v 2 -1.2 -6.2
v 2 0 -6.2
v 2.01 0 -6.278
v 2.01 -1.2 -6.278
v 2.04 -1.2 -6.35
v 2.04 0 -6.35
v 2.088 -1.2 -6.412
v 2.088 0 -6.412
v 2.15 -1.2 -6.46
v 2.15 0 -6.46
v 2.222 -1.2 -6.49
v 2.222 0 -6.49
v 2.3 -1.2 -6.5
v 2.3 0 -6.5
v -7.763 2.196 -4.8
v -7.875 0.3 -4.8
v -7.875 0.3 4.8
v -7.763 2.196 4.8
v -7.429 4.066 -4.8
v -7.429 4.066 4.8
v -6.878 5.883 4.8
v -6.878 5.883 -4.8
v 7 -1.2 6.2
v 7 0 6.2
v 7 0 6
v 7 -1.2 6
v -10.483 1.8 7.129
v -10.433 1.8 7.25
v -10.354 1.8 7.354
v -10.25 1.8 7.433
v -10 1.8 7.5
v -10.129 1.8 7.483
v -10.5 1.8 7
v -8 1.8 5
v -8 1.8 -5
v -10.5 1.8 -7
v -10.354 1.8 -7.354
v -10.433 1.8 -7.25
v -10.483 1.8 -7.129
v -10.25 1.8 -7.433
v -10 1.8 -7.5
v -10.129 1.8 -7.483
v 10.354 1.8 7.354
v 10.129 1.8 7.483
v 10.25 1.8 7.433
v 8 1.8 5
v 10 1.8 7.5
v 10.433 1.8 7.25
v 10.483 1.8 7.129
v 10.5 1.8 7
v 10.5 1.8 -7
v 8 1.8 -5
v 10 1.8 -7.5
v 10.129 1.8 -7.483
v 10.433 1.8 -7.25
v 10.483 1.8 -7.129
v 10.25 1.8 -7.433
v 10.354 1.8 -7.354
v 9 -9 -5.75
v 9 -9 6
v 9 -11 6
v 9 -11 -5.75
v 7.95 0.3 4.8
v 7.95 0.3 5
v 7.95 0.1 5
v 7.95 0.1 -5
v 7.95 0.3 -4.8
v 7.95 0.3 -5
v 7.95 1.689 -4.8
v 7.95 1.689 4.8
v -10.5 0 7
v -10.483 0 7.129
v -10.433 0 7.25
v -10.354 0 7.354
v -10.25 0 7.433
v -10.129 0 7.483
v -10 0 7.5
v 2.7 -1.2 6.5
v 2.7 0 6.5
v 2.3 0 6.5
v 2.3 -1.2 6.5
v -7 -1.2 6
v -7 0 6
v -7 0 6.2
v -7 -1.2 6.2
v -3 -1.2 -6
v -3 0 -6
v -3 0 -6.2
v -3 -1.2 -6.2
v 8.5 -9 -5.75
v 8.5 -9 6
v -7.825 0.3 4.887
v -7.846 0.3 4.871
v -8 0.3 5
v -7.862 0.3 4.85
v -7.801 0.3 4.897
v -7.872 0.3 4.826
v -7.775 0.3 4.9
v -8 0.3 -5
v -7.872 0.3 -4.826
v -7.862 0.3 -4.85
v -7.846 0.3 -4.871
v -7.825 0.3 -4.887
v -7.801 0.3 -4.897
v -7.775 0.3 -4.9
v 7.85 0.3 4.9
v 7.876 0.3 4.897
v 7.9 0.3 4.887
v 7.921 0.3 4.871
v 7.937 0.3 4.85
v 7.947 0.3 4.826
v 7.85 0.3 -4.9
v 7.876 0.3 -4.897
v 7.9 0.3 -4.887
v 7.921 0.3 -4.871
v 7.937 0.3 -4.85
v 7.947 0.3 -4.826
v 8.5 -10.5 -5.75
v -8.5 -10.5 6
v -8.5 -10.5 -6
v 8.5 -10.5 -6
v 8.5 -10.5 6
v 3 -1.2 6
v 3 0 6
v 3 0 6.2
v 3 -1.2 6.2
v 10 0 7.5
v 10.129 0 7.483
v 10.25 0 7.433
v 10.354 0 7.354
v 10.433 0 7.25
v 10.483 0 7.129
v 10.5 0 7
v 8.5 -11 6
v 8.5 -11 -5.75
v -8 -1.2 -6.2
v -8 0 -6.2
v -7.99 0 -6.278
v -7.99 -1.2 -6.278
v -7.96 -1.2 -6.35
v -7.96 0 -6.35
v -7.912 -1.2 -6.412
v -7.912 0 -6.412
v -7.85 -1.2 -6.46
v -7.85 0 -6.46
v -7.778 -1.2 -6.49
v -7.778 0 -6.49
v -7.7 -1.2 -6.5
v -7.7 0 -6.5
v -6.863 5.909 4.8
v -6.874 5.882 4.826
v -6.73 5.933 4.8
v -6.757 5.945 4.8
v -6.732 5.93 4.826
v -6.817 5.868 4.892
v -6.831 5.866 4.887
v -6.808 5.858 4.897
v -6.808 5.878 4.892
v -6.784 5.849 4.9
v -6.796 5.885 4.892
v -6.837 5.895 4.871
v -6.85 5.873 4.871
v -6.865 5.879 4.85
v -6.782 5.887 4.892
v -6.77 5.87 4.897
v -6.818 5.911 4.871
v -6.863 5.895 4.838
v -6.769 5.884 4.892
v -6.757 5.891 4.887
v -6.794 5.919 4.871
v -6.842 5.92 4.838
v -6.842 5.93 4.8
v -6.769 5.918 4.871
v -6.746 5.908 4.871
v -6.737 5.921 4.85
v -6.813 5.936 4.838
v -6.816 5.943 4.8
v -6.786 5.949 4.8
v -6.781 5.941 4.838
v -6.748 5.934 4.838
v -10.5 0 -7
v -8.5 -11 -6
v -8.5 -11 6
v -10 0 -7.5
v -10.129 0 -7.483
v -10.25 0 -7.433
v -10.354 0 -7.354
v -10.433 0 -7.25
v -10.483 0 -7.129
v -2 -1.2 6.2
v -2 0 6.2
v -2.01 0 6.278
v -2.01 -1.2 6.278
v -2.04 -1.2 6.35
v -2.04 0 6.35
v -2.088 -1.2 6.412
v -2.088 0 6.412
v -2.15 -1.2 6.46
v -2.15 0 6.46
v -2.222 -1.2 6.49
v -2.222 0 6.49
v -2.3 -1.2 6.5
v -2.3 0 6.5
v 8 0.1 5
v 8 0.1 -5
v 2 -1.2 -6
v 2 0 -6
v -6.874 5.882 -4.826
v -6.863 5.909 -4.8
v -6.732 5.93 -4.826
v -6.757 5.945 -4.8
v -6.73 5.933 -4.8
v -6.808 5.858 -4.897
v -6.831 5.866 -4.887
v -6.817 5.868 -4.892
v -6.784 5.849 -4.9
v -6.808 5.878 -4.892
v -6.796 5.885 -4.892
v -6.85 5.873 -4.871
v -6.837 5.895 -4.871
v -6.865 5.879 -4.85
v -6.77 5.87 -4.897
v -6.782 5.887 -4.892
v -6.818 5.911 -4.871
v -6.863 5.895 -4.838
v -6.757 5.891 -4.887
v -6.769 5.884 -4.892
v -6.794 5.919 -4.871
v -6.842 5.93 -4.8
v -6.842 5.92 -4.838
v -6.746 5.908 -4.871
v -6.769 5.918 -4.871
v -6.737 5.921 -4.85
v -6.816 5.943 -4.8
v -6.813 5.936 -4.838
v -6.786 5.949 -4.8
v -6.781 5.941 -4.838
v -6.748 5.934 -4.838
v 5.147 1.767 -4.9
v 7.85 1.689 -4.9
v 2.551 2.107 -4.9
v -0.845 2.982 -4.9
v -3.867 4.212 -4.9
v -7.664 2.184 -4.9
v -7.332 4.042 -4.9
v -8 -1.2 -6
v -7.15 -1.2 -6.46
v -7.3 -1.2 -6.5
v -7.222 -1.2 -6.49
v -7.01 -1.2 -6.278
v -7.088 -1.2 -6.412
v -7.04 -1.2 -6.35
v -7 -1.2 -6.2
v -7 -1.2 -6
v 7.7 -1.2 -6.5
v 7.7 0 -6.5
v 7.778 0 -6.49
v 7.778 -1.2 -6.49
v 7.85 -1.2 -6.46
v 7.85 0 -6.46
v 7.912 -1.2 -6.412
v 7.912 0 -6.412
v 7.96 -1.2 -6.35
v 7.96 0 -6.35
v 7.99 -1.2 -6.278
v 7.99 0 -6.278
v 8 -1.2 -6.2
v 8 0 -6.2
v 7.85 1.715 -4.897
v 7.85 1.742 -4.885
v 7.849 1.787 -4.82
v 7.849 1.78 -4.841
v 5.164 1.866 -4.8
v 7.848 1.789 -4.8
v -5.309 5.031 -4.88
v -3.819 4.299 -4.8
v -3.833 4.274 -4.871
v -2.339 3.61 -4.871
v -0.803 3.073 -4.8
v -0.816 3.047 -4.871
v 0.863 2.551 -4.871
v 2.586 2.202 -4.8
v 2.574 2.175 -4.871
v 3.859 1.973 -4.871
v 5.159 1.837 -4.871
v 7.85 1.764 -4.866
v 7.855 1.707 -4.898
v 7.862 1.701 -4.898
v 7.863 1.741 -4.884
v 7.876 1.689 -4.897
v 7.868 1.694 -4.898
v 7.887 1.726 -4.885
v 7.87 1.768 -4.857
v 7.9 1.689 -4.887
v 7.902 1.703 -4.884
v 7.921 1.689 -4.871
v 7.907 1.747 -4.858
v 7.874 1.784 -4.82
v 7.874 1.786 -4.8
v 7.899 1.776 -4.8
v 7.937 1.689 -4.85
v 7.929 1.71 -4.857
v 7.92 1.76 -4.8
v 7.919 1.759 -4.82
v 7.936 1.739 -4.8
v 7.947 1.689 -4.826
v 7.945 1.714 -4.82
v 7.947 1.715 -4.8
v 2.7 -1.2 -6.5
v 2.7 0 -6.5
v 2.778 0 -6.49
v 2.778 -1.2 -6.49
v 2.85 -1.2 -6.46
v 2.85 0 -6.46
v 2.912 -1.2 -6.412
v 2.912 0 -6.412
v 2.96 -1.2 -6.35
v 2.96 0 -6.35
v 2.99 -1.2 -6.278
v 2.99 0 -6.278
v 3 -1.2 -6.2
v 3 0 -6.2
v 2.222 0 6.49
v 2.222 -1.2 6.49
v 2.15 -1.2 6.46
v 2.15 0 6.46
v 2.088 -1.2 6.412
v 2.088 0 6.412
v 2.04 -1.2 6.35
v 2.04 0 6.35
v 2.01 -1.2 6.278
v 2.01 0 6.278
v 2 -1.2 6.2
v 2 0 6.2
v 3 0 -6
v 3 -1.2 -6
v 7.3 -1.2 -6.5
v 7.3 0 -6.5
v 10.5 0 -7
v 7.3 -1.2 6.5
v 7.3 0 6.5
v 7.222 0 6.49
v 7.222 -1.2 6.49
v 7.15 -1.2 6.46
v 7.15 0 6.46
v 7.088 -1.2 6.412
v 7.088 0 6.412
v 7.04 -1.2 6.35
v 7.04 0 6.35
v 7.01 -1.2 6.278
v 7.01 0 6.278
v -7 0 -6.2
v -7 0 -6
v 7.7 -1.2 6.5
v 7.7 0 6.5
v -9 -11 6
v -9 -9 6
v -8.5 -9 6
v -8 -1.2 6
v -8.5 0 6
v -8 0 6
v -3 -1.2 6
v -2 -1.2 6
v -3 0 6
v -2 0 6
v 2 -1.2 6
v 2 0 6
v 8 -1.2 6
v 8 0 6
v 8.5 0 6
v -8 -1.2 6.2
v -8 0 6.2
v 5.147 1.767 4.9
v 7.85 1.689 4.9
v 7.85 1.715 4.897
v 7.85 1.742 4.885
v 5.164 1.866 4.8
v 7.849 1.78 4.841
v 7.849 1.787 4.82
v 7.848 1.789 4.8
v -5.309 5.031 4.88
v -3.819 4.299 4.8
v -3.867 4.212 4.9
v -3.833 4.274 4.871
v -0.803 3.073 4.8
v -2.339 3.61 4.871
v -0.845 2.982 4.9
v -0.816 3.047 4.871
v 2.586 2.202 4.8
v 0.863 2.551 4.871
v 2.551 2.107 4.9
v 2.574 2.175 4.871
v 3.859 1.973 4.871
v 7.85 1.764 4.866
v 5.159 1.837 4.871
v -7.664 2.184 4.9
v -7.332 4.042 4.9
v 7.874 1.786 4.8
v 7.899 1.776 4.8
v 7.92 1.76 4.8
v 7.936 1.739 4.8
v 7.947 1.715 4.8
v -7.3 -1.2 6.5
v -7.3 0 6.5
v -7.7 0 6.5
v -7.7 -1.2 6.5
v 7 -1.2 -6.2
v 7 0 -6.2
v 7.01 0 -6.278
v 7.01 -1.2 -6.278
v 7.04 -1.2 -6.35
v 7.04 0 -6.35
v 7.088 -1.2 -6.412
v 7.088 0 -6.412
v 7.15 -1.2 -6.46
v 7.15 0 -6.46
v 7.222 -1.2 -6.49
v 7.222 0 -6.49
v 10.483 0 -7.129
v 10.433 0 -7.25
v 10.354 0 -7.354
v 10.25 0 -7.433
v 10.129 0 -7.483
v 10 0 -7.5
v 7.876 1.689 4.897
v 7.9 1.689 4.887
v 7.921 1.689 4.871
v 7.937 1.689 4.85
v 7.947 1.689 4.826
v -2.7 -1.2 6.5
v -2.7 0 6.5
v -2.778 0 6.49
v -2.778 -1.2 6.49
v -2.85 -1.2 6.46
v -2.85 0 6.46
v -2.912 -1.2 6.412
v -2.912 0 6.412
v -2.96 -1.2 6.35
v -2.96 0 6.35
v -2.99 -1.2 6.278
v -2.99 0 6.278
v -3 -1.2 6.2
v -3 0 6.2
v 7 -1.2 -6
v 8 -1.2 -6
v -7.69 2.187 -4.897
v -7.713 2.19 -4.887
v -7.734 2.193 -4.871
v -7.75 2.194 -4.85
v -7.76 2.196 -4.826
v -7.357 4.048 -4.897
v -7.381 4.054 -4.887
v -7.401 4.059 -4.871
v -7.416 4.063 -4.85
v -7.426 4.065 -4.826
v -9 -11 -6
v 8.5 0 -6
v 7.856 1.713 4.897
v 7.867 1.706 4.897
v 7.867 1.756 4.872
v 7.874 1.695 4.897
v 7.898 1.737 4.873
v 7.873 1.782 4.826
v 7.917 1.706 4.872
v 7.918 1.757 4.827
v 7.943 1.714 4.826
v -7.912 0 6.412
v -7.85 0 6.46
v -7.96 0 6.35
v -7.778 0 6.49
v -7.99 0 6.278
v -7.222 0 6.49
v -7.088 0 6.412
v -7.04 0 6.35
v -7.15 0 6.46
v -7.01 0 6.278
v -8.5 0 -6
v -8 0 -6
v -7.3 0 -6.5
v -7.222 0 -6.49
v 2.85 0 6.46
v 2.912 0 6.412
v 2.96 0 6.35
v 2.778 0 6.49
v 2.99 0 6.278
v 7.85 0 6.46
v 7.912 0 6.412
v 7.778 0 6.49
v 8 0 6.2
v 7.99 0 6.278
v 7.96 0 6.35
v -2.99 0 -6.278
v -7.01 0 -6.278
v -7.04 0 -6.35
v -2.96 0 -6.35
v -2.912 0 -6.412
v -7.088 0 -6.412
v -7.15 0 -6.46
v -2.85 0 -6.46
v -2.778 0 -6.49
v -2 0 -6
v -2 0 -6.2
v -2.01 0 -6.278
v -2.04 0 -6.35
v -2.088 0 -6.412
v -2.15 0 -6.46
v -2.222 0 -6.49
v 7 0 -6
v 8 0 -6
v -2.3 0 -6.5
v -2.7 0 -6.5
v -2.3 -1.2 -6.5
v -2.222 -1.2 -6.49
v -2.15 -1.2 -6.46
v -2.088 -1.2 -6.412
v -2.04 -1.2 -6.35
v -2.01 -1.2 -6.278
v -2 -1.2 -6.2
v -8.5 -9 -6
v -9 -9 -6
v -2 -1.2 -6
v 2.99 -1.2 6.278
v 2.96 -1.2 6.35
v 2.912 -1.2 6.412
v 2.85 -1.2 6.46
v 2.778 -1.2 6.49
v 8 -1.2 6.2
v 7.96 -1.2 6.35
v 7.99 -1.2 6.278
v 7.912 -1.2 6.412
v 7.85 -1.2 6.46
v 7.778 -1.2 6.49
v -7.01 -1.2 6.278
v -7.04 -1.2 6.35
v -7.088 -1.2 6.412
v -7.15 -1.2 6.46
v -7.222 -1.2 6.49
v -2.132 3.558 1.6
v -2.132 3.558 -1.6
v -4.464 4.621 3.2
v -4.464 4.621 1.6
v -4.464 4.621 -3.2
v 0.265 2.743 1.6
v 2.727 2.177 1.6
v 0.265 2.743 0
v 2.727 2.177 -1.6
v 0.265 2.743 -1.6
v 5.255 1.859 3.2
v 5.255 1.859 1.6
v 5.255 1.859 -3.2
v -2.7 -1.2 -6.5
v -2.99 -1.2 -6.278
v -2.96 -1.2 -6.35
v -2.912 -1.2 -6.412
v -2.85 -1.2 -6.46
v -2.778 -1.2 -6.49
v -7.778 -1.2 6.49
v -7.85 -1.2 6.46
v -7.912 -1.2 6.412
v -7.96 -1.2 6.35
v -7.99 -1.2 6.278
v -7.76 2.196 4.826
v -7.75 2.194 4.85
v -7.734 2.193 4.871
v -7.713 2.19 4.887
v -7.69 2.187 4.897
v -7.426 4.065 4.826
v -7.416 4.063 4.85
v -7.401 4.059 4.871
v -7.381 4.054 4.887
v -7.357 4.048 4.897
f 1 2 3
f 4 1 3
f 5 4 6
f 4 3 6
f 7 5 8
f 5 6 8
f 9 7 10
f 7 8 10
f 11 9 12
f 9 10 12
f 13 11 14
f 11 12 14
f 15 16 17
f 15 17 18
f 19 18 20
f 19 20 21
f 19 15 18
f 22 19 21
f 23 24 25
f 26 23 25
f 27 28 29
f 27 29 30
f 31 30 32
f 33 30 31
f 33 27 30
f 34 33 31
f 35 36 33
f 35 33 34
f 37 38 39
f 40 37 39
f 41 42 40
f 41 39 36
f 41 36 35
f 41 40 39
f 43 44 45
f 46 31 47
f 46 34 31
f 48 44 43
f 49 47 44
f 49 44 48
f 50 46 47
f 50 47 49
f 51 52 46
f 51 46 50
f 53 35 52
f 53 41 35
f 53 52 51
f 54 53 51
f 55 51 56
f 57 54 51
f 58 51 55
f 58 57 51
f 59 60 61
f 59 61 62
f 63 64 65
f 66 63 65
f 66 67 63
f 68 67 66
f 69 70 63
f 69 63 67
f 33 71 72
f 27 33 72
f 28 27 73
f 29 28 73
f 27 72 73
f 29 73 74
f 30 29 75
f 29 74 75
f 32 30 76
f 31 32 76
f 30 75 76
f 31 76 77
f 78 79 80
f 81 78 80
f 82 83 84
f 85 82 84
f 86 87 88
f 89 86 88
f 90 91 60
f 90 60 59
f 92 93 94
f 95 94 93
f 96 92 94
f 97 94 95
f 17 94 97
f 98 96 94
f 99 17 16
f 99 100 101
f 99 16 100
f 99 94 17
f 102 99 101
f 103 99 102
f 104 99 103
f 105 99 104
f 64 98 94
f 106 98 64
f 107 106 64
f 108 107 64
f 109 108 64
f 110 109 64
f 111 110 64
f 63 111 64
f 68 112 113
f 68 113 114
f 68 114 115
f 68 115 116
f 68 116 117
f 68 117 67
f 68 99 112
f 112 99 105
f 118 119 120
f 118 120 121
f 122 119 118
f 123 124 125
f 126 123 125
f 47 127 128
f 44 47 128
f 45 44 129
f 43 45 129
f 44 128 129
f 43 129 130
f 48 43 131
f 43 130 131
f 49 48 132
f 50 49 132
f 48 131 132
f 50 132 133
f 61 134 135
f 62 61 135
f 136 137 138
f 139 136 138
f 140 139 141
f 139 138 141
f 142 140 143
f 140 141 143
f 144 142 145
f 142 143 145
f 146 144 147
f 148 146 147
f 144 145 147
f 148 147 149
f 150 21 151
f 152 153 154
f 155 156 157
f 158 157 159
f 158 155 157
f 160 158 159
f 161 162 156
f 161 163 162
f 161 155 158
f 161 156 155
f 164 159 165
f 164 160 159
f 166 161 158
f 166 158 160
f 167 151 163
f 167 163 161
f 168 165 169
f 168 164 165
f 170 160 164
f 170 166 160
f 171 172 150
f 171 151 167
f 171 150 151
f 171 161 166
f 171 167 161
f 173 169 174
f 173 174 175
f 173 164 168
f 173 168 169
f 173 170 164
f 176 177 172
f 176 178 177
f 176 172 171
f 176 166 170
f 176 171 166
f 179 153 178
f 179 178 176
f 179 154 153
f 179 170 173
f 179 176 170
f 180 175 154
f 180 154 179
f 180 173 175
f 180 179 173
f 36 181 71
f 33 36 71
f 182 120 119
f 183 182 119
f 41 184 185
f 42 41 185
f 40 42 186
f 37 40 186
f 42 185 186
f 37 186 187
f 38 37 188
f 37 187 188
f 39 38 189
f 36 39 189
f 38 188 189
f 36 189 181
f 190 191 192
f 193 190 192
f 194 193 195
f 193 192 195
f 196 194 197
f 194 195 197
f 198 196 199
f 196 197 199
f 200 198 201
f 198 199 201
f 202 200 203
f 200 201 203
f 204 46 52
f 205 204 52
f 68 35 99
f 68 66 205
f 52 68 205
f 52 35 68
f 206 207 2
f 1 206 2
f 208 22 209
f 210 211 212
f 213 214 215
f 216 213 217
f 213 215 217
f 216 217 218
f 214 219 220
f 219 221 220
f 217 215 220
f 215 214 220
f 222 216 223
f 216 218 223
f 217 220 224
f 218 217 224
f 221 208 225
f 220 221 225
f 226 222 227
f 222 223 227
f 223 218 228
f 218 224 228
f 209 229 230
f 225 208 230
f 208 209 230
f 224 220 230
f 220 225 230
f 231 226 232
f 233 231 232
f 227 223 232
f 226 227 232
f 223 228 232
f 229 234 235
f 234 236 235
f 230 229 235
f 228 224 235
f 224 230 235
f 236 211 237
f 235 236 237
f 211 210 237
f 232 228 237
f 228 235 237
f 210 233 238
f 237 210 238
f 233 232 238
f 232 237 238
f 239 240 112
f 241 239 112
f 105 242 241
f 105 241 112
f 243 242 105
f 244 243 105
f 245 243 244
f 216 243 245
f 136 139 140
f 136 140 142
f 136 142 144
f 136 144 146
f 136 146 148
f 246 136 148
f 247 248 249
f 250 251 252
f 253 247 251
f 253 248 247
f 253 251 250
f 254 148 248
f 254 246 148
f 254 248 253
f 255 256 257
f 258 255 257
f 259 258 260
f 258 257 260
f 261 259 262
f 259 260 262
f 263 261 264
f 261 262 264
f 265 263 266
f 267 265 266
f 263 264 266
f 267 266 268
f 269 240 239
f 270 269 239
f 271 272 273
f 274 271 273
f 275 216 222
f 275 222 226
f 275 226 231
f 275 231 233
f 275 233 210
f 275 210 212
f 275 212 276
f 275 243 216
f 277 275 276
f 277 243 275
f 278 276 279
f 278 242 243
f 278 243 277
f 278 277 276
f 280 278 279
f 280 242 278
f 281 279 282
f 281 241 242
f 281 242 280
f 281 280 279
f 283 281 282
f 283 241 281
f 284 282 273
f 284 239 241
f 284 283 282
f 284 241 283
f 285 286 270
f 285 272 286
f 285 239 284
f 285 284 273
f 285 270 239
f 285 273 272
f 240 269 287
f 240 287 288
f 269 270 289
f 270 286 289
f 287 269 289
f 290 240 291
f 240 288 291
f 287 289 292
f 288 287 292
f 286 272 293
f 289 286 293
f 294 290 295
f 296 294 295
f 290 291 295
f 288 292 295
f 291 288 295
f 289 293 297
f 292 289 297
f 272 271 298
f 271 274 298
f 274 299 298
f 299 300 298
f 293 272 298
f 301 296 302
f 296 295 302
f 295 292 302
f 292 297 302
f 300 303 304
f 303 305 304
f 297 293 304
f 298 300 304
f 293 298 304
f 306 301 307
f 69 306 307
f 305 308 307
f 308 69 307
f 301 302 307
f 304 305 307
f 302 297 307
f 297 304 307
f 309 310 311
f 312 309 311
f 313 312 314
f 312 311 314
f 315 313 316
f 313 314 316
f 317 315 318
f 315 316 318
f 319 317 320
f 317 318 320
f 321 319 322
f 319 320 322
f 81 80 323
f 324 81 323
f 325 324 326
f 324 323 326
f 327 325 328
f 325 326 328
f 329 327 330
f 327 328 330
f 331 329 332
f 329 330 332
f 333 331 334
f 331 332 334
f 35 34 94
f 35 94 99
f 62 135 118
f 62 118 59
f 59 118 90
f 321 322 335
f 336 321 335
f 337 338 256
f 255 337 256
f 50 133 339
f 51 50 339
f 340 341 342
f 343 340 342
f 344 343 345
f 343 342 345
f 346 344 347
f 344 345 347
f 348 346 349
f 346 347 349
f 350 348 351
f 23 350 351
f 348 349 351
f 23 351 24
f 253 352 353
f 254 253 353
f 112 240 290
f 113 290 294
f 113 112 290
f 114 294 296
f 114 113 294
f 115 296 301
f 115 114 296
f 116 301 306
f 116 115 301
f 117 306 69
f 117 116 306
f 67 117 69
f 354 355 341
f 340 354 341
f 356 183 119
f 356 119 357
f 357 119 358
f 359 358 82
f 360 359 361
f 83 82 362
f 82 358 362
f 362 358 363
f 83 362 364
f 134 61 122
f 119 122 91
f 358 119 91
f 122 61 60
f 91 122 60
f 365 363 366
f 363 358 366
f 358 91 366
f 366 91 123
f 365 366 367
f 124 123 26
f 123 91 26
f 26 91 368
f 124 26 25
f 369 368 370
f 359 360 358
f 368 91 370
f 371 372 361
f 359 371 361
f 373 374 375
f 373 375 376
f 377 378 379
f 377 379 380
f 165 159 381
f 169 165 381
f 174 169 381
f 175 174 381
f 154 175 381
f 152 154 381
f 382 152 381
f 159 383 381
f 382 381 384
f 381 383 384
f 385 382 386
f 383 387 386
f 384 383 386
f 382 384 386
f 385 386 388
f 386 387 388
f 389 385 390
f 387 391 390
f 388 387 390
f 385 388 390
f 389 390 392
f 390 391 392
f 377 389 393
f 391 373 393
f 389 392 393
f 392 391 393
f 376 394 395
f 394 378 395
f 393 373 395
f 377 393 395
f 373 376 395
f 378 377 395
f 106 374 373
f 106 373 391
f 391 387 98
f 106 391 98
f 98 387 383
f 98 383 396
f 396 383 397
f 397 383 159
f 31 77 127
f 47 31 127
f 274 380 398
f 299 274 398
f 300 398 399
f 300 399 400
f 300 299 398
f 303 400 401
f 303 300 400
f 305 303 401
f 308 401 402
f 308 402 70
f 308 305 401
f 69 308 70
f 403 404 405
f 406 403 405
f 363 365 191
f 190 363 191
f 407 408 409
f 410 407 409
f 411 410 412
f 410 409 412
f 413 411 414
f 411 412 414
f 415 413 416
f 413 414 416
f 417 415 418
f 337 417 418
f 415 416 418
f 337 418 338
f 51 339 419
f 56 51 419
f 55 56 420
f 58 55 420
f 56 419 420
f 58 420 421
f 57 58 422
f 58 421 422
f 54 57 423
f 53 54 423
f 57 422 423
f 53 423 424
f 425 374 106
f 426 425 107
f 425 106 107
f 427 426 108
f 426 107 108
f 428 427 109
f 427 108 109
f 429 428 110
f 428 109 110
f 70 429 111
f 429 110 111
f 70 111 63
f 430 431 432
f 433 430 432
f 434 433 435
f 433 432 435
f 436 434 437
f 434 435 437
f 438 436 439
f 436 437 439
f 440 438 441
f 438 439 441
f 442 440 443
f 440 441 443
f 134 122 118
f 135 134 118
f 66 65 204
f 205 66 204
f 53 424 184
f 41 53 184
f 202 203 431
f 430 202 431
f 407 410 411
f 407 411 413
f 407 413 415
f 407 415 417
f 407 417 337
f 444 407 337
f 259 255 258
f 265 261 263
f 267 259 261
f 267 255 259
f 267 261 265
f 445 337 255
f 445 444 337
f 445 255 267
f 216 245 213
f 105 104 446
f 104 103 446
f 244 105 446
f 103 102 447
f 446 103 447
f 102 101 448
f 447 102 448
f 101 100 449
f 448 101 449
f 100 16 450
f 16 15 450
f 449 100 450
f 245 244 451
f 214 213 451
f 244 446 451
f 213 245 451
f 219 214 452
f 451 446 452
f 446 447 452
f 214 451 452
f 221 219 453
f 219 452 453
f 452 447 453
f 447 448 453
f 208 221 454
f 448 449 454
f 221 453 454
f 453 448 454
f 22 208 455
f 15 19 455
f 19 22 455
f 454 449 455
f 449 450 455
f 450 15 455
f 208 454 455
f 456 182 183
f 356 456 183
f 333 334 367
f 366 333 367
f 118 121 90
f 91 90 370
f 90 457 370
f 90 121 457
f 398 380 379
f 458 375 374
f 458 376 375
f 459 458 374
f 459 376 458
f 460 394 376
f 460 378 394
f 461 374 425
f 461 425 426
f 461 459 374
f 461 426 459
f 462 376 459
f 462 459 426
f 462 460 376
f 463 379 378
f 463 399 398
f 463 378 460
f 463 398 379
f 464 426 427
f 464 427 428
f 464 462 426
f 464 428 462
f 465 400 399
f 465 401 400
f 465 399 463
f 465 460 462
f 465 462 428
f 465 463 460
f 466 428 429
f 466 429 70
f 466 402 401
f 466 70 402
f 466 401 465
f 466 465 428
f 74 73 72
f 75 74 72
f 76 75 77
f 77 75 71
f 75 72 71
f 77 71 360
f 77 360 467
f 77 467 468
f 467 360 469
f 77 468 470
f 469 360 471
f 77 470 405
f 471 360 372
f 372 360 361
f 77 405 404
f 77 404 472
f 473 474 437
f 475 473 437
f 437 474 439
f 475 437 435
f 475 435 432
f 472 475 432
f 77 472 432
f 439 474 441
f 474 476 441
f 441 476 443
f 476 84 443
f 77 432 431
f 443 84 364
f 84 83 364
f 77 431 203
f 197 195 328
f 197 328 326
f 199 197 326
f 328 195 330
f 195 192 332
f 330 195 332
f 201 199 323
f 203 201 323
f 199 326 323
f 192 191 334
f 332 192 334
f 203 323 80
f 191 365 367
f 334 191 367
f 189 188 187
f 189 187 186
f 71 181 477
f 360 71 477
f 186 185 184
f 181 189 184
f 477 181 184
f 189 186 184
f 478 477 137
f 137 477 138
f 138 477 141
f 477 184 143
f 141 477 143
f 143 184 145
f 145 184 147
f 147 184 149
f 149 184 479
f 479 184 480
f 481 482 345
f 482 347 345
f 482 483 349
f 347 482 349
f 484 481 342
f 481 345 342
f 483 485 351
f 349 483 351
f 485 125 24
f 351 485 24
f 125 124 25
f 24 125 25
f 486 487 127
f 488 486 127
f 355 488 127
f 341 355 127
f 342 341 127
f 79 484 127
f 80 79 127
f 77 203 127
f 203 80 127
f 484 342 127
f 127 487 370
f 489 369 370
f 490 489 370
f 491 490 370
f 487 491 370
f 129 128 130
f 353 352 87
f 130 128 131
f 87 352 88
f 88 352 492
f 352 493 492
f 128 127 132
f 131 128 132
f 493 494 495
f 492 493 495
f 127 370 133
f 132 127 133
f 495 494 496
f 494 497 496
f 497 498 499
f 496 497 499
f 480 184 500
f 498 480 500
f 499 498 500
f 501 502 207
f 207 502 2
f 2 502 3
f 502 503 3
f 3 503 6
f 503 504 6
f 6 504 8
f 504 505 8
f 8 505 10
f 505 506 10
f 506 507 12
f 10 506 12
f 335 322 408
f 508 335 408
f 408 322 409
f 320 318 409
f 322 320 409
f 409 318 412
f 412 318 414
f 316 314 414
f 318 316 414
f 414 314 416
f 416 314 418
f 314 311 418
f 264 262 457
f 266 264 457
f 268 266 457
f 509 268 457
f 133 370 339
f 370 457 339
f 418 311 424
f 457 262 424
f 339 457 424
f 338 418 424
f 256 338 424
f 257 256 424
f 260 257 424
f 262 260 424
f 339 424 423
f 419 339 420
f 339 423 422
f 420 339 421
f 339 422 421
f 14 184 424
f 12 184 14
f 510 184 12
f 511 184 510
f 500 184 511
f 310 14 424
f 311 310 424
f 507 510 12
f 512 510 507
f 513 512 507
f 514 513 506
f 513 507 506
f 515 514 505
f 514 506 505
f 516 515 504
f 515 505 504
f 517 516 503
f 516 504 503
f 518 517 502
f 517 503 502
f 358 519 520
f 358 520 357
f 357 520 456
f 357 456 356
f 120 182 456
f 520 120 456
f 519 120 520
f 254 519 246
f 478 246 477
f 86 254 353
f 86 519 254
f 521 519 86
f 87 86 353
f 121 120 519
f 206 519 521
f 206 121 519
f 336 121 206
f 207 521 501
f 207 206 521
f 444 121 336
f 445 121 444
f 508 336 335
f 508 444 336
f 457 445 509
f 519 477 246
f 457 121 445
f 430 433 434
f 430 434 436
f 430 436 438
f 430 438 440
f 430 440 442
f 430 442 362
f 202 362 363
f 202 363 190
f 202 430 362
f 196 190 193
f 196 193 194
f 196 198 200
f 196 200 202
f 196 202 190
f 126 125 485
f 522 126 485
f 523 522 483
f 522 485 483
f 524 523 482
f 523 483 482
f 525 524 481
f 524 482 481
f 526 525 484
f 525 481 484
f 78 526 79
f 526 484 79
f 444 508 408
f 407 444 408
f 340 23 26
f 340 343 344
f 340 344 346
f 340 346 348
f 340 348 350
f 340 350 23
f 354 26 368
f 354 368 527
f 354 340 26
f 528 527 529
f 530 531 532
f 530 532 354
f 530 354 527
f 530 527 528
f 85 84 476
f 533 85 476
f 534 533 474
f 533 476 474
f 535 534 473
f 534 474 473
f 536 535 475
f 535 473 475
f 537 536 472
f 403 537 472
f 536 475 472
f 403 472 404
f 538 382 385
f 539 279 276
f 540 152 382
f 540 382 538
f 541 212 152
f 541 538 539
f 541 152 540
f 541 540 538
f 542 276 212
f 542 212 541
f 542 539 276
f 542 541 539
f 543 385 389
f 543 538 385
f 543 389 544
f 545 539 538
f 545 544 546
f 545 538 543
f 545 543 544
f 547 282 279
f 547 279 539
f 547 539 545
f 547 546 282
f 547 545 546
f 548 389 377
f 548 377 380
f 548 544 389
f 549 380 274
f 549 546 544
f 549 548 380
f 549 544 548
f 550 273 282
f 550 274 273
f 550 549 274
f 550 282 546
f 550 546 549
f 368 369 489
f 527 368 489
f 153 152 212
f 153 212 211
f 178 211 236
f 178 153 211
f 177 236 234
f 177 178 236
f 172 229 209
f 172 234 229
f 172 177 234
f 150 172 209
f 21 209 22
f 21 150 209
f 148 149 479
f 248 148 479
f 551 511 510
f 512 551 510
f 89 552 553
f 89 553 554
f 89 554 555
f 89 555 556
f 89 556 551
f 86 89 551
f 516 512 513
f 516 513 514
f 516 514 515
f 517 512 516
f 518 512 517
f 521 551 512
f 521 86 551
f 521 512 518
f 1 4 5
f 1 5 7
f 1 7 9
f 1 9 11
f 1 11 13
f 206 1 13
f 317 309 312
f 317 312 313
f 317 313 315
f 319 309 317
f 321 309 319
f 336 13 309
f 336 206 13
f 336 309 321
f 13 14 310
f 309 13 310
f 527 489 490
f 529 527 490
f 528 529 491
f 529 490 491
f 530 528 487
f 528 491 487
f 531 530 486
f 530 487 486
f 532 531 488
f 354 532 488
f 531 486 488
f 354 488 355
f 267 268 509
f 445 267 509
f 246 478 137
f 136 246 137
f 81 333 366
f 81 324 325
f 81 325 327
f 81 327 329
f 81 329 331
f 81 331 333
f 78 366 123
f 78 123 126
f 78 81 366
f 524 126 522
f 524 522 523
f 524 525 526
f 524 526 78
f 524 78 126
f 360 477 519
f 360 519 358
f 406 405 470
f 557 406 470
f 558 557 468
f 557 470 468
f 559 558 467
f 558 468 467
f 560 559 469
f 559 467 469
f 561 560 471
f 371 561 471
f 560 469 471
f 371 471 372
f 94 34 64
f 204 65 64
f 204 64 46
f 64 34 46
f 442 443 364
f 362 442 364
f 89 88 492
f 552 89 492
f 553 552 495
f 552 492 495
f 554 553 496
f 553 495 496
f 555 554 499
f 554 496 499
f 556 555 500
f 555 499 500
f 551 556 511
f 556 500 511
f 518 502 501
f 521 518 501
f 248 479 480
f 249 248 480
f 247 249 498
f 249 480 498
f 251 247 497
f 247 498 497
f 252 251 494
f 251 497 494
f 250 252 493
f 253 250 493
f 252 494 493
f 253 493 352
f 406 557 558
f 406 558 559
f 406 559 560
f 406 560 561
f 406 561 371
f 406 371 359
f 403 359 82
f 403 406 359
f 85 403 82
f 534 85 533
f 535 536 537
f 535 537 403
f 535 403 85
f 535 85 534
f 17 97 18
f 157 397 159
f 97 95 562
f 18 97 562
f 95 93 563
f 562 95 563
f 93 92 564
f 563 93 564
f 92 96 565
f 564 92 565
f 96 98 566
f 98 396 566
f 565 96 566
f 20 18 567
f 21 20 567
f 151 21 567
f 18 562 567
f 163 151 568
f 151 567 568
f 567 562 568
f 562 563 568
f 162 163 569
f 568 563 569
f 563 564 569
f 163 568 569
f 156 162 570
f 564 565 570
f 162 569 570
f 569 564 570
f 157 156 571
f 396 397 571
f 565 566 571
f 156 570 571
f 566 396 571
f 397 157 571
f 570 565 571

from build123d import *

# Parameters (mm, degrees)
SALIENTE_EXTRUIR1_DEPTH      = 1.8
CROQUIS2_W                   = 16
CROQUIS2_H                   = 10
CORTAR_EXTRUIR1_DEPTH        = 1.5
SALIENTE_EXTRUIR3_DEPTH      = 4.9
SALIENTE_EXTRUIR3_DEPTH_BACK = 4.9
CROQUIS4_W                   = 0.05
CROQUIS4_H                   = 10
CORTAR_EXTRUIR2_DEPTH        = 1.7
REDONDEO1_R                  = 0.1
REDONDEO2_R                  = 0.1
CROQUIS5_W                   = 17
CROQUIS5_H                   = 12
SALIENTE_EXTRUIR4_DEPTH      = 10.5
SALIENTE_EXTRUIR5_DEPTH      = 1.2
CROQUIS7_W                   = 11.75
CROQUIS7_H                   = 2
SALIENTE_EXTRUIR6_DEPTH      = 0.5
CROQUIS8_W                   = 12
CROQUIS8_H                   = 2
SALIENTE_EXTRUIR7_DEPTH      = 0.5


with BuildPart() as part:
    # Croquis1 → Saliente-Extruir1 (new body)
    with BuildSketch(Plane(origin=(0, 0, 0), x_dir=(1, 0, 0), z_dir=(0, 1, 0))):
        with BuildLine():
            Line((-10, -7.5), (10, -7.5))
            ThreePointArc((10, -7.5), (10.353553391, -7.353553391), (10.5, -7))
            Line((10.5, -7), (10.5, 7))
            ThreePointArc((10.5, 7), (10.353553391, 7.353553391), (10, 7.5))
            Line((10, 7.5), (-10, 7.5))
            ThreePointArc((-10, 7.5), (-10.353553391, 7.353553391), (-10.5, 7))
            Line((-10.5, 7), (-10.5, -7))
            ThreePointArc((-10.5, -7), (-10.353553391, -7.353553391), (-10, -7.5))
        make_face()
    extrude(amount=SALIENTE_EXTRUIR1_DEPTH)

    # Croquis2 → Cortar-Extruir1 (cut)
    with BuildSketch(Plane(origin=(0, 1.8, 0), x_dir=(1, 0, 0), z_dir=(0, 1, 0))):
        Rectangle(CROQUIS2_W, CROQUIS2_H)
    extrude(amount=-CORTAR_EXTRUIR1_DEPTH, mode=Mode.SUBTRACT)

    # Croquis3 → Saliente-Extruir3 (add, two sides: drawn at the far end of the back side and taken through both)
    with BuildSketch(Plane.XY.offset(-SALIENTE_EXTRUIR3_DEPTH_BACK)):
        with BuildLine():
            Line((8.046935069, 1.793629428), (8.088403313, 0.3))
            Line((8.088403313, 0.3), (-7.875, 0.3))
            ThreePointArc((-7.875, 0.3), (-7.612603193, 3.197144273), (-6.833952566, 6))
            add(Edge.make_bspline(
                [(-6.833952566, 6), (-2.282486721, 3.046687717), (2.677809157, 1.644564193), (8.046935069, 1.793629428)],
                knots=[0, 0, 0, 0, 0.987561785, 0.987561785, 0.987561785, 0.987561785], degree=3))
        make_face()
    extrude(amount=SALIENTE_EXTRUIR3_DEPTH + SALIENTE_EXTRUIR3_DEPTH_BACK)

    # Croquis4 → Cortar-Extruir2 (cut)
    with BuildSketch(Plane(origin=(0, 1.8, 0), x_dir=(1, 0, 0), z_dir=(0, 1, 0))):
        with Locations((7.975, 0)):
            Rectangle(CROQUIS4_W, CROQUIS4_H)
    extrude(amount=-CORTAR_EXTRUIR2_DEPTH, mode=Mode.SUBTRACT)

    # Redondeo1
    redondeo1_edges = [part.edges().sort_by_distance(p)[0] for p in [
        (7.95, 1.791105638, -2.45),
    ]]
    fillet(redondeo1_edges, radius=REDONDEO1_R)

    # Redondeo2
    redondeo2_edges = [part.edges().sort_by_distance(p)[0] for p in [
        (-6.833952566, 6, -2.45),
        (-7.612603193, 3.197144273, 4.9),
        (-7.612603193, 3.197144273, -4.9),
        (7.95, 0.994416132, 4.9),
        (7.95, 0.994416132, -4.9),
        (0.184059834, 2.766462, 4.9),
        (7.919976694, 1.760269386, 4.9),
        (0.184059834, 2.766462, -4.9),
        (7.919976694, 1.760269386, -4.9),
    ]]
    fillet(redondeo2_edges, radius=REDONDEO2_R)

    # Croquis5 → Saliente-Extruir4 (add)
    with BuildSketch(Plane.XZ):
        Rectangle(CROQUIS5_W, CROQUIS5_H)
    extrude(amount=SALIENTE_EXTRUIR4_DEPTH)

    # Croquis6 → Saliente-Extruir5 (add)
    with BuildSketch(Plane.XZ):
        with BuildLine():
            Line((-8, 6), (-7, 6))
            Line((-7, 6), (-7, 6.2))
            ThreePointArc((-7, 6.2), (-7.087867966, 6.412132034), (-7.3, 6.5))
            Line((-7.3, 6.5), (-7.7, 6.5))
            ThreePointArc((-7.7, 6.5), (-7.912132034, 6.412132034), (-8, 6.2))
            Line((-8, 6.2), (-8, 6))
        make_face()
        with BuildLine():
            Line((-3, 6), (-2, 6))
            Line((-2, 6), (-2, 6.2))
            ThreePointArc((-2, 6.2), (-2.087867966, 6.412132034), (-2.3, 6.5))
            Line((-2.3, 6.5), (-2.7, 6.5))
            ThreePointArc((-2.7, 6.5), (-2.912132034, 6.412132034), (-3, 6.2))
            Line((-3, 6.2), (-3, 6))
        make_face()
        with BuildLine():
            Line((2, 6.2), (2, 6))
            Line((2, 6), (3, 6))
            Line((3, 6), (3, 6.2))
            ThreePointArc((3, 6.2), (2.912132034, 6.412132034), (2.7, 6.5))
            Line((2.7, 6.5), (2.3, 6.5))
            ThreePointArc((2.3, 6.5), (2.087867966, 6.412132034), (2, 6.2))
        make_face()
        with BuildLine():
            Line((7, 6.2), (7, 6))
            Line((7, 6), (8, 6))
            Line((8, 6), (8, 6.2))
            ThreePointArc((8, 6.2), (7.912132034, 6.412132034), (7.7, 6.5))
            Line((7.7, 6.5), (7.3, 6.5))
            ThreePointArc((7.3, 6.5), (7.087867966, 6.412132034), (7, 6.2))
        make_face()
        with BuildLine():
            Line((3, -6), (2, -6))
            Line((2, -6), (2, -6.2))
            ThreePointArc((2, -6.2), (2.087867966, -6.412132034), (2.3, -6.5))
            Line((2.3, -6.5), (2.7, -6.5))
            ThreePointArc((2.7, -6.5), (2.912132034, -6.412132034), (3, -6.2))
            Line((3, -6.2), (3, -6))
        make_face()
        with BuildLine():
            Line((8, -6), (7, -6))
            Line((7, -6), (7, -6.2))
            ThreePointArc((7, -6.2), (7.087867966, -6.412132034), (7.3, -6.5))
            Line((7.3, -6.5), (7.7, -6.5))
            ThreePointArc((7.7, -6.5), (7.912132034, -6.412132034), (8, -6.2))
            Line((8, -6.2), (8, -6))
        make_face()
        with BuildLine():
            Line((-2, -6), (-3, -6))
            Line((-3, -6), (-3, -6.2))
            ThreePointArc((-3, -6.2), (-2.912132034, -6.412132034), (-2.7, -6.5))
            Line((-2.7, -6.5), (-2.3, -6.5))
            ThreePointArc((-2.3, -6.5), (-2.087867966, -6.412132034), (-2, -6.2))
            Line((-2, -6.2), (-2, -6))
        make_face()
        with BuildLine():
            Line((-7, -6), (-8, -6))
            Line((-8, -6), (-8, -6.2))
            ThreePointArc((-8, -6.2), (-7.912132034, -6.412132034), (-7.7, -6.5))
            Line((-7.7, -6.5), (-7.3, -6.5))
            ThreePointArc((-7.3, -6.5), (-7.087867966, -6.412132034), (-7, -6.2))
            Line((-7, -6.2), (-7, -6))
        make_face()
    extrude(amount=SALIENTE_EXTRUIR5_DEPTH)

    # Croquis7 → Saliente-Extruir6 (add)
    with BuildSketch(Plane(origin=(8.5, 0, 0), x_dir=(0, 0, -1), z_dir=(1, 0, 0))):
        with Locations((-0.125, -10)):
            Rectangle(CROQUIS7_W, CROQUIS7_H)
    extrude(amount=SALIENTE_EXTRUIR6_DEPTH)

    # Croquis8 → Saliente-Extruir7 (add)
    with BuildSketch(Plane.ZY.offset(8.5)):
        with Locations((0, -10)):
            Rectangle(CROQUIS8_W, CROQUIS8_H)
    extrude(amount=SALIENTE_EXTRUIR7_DEPTH)


solid = part.part
